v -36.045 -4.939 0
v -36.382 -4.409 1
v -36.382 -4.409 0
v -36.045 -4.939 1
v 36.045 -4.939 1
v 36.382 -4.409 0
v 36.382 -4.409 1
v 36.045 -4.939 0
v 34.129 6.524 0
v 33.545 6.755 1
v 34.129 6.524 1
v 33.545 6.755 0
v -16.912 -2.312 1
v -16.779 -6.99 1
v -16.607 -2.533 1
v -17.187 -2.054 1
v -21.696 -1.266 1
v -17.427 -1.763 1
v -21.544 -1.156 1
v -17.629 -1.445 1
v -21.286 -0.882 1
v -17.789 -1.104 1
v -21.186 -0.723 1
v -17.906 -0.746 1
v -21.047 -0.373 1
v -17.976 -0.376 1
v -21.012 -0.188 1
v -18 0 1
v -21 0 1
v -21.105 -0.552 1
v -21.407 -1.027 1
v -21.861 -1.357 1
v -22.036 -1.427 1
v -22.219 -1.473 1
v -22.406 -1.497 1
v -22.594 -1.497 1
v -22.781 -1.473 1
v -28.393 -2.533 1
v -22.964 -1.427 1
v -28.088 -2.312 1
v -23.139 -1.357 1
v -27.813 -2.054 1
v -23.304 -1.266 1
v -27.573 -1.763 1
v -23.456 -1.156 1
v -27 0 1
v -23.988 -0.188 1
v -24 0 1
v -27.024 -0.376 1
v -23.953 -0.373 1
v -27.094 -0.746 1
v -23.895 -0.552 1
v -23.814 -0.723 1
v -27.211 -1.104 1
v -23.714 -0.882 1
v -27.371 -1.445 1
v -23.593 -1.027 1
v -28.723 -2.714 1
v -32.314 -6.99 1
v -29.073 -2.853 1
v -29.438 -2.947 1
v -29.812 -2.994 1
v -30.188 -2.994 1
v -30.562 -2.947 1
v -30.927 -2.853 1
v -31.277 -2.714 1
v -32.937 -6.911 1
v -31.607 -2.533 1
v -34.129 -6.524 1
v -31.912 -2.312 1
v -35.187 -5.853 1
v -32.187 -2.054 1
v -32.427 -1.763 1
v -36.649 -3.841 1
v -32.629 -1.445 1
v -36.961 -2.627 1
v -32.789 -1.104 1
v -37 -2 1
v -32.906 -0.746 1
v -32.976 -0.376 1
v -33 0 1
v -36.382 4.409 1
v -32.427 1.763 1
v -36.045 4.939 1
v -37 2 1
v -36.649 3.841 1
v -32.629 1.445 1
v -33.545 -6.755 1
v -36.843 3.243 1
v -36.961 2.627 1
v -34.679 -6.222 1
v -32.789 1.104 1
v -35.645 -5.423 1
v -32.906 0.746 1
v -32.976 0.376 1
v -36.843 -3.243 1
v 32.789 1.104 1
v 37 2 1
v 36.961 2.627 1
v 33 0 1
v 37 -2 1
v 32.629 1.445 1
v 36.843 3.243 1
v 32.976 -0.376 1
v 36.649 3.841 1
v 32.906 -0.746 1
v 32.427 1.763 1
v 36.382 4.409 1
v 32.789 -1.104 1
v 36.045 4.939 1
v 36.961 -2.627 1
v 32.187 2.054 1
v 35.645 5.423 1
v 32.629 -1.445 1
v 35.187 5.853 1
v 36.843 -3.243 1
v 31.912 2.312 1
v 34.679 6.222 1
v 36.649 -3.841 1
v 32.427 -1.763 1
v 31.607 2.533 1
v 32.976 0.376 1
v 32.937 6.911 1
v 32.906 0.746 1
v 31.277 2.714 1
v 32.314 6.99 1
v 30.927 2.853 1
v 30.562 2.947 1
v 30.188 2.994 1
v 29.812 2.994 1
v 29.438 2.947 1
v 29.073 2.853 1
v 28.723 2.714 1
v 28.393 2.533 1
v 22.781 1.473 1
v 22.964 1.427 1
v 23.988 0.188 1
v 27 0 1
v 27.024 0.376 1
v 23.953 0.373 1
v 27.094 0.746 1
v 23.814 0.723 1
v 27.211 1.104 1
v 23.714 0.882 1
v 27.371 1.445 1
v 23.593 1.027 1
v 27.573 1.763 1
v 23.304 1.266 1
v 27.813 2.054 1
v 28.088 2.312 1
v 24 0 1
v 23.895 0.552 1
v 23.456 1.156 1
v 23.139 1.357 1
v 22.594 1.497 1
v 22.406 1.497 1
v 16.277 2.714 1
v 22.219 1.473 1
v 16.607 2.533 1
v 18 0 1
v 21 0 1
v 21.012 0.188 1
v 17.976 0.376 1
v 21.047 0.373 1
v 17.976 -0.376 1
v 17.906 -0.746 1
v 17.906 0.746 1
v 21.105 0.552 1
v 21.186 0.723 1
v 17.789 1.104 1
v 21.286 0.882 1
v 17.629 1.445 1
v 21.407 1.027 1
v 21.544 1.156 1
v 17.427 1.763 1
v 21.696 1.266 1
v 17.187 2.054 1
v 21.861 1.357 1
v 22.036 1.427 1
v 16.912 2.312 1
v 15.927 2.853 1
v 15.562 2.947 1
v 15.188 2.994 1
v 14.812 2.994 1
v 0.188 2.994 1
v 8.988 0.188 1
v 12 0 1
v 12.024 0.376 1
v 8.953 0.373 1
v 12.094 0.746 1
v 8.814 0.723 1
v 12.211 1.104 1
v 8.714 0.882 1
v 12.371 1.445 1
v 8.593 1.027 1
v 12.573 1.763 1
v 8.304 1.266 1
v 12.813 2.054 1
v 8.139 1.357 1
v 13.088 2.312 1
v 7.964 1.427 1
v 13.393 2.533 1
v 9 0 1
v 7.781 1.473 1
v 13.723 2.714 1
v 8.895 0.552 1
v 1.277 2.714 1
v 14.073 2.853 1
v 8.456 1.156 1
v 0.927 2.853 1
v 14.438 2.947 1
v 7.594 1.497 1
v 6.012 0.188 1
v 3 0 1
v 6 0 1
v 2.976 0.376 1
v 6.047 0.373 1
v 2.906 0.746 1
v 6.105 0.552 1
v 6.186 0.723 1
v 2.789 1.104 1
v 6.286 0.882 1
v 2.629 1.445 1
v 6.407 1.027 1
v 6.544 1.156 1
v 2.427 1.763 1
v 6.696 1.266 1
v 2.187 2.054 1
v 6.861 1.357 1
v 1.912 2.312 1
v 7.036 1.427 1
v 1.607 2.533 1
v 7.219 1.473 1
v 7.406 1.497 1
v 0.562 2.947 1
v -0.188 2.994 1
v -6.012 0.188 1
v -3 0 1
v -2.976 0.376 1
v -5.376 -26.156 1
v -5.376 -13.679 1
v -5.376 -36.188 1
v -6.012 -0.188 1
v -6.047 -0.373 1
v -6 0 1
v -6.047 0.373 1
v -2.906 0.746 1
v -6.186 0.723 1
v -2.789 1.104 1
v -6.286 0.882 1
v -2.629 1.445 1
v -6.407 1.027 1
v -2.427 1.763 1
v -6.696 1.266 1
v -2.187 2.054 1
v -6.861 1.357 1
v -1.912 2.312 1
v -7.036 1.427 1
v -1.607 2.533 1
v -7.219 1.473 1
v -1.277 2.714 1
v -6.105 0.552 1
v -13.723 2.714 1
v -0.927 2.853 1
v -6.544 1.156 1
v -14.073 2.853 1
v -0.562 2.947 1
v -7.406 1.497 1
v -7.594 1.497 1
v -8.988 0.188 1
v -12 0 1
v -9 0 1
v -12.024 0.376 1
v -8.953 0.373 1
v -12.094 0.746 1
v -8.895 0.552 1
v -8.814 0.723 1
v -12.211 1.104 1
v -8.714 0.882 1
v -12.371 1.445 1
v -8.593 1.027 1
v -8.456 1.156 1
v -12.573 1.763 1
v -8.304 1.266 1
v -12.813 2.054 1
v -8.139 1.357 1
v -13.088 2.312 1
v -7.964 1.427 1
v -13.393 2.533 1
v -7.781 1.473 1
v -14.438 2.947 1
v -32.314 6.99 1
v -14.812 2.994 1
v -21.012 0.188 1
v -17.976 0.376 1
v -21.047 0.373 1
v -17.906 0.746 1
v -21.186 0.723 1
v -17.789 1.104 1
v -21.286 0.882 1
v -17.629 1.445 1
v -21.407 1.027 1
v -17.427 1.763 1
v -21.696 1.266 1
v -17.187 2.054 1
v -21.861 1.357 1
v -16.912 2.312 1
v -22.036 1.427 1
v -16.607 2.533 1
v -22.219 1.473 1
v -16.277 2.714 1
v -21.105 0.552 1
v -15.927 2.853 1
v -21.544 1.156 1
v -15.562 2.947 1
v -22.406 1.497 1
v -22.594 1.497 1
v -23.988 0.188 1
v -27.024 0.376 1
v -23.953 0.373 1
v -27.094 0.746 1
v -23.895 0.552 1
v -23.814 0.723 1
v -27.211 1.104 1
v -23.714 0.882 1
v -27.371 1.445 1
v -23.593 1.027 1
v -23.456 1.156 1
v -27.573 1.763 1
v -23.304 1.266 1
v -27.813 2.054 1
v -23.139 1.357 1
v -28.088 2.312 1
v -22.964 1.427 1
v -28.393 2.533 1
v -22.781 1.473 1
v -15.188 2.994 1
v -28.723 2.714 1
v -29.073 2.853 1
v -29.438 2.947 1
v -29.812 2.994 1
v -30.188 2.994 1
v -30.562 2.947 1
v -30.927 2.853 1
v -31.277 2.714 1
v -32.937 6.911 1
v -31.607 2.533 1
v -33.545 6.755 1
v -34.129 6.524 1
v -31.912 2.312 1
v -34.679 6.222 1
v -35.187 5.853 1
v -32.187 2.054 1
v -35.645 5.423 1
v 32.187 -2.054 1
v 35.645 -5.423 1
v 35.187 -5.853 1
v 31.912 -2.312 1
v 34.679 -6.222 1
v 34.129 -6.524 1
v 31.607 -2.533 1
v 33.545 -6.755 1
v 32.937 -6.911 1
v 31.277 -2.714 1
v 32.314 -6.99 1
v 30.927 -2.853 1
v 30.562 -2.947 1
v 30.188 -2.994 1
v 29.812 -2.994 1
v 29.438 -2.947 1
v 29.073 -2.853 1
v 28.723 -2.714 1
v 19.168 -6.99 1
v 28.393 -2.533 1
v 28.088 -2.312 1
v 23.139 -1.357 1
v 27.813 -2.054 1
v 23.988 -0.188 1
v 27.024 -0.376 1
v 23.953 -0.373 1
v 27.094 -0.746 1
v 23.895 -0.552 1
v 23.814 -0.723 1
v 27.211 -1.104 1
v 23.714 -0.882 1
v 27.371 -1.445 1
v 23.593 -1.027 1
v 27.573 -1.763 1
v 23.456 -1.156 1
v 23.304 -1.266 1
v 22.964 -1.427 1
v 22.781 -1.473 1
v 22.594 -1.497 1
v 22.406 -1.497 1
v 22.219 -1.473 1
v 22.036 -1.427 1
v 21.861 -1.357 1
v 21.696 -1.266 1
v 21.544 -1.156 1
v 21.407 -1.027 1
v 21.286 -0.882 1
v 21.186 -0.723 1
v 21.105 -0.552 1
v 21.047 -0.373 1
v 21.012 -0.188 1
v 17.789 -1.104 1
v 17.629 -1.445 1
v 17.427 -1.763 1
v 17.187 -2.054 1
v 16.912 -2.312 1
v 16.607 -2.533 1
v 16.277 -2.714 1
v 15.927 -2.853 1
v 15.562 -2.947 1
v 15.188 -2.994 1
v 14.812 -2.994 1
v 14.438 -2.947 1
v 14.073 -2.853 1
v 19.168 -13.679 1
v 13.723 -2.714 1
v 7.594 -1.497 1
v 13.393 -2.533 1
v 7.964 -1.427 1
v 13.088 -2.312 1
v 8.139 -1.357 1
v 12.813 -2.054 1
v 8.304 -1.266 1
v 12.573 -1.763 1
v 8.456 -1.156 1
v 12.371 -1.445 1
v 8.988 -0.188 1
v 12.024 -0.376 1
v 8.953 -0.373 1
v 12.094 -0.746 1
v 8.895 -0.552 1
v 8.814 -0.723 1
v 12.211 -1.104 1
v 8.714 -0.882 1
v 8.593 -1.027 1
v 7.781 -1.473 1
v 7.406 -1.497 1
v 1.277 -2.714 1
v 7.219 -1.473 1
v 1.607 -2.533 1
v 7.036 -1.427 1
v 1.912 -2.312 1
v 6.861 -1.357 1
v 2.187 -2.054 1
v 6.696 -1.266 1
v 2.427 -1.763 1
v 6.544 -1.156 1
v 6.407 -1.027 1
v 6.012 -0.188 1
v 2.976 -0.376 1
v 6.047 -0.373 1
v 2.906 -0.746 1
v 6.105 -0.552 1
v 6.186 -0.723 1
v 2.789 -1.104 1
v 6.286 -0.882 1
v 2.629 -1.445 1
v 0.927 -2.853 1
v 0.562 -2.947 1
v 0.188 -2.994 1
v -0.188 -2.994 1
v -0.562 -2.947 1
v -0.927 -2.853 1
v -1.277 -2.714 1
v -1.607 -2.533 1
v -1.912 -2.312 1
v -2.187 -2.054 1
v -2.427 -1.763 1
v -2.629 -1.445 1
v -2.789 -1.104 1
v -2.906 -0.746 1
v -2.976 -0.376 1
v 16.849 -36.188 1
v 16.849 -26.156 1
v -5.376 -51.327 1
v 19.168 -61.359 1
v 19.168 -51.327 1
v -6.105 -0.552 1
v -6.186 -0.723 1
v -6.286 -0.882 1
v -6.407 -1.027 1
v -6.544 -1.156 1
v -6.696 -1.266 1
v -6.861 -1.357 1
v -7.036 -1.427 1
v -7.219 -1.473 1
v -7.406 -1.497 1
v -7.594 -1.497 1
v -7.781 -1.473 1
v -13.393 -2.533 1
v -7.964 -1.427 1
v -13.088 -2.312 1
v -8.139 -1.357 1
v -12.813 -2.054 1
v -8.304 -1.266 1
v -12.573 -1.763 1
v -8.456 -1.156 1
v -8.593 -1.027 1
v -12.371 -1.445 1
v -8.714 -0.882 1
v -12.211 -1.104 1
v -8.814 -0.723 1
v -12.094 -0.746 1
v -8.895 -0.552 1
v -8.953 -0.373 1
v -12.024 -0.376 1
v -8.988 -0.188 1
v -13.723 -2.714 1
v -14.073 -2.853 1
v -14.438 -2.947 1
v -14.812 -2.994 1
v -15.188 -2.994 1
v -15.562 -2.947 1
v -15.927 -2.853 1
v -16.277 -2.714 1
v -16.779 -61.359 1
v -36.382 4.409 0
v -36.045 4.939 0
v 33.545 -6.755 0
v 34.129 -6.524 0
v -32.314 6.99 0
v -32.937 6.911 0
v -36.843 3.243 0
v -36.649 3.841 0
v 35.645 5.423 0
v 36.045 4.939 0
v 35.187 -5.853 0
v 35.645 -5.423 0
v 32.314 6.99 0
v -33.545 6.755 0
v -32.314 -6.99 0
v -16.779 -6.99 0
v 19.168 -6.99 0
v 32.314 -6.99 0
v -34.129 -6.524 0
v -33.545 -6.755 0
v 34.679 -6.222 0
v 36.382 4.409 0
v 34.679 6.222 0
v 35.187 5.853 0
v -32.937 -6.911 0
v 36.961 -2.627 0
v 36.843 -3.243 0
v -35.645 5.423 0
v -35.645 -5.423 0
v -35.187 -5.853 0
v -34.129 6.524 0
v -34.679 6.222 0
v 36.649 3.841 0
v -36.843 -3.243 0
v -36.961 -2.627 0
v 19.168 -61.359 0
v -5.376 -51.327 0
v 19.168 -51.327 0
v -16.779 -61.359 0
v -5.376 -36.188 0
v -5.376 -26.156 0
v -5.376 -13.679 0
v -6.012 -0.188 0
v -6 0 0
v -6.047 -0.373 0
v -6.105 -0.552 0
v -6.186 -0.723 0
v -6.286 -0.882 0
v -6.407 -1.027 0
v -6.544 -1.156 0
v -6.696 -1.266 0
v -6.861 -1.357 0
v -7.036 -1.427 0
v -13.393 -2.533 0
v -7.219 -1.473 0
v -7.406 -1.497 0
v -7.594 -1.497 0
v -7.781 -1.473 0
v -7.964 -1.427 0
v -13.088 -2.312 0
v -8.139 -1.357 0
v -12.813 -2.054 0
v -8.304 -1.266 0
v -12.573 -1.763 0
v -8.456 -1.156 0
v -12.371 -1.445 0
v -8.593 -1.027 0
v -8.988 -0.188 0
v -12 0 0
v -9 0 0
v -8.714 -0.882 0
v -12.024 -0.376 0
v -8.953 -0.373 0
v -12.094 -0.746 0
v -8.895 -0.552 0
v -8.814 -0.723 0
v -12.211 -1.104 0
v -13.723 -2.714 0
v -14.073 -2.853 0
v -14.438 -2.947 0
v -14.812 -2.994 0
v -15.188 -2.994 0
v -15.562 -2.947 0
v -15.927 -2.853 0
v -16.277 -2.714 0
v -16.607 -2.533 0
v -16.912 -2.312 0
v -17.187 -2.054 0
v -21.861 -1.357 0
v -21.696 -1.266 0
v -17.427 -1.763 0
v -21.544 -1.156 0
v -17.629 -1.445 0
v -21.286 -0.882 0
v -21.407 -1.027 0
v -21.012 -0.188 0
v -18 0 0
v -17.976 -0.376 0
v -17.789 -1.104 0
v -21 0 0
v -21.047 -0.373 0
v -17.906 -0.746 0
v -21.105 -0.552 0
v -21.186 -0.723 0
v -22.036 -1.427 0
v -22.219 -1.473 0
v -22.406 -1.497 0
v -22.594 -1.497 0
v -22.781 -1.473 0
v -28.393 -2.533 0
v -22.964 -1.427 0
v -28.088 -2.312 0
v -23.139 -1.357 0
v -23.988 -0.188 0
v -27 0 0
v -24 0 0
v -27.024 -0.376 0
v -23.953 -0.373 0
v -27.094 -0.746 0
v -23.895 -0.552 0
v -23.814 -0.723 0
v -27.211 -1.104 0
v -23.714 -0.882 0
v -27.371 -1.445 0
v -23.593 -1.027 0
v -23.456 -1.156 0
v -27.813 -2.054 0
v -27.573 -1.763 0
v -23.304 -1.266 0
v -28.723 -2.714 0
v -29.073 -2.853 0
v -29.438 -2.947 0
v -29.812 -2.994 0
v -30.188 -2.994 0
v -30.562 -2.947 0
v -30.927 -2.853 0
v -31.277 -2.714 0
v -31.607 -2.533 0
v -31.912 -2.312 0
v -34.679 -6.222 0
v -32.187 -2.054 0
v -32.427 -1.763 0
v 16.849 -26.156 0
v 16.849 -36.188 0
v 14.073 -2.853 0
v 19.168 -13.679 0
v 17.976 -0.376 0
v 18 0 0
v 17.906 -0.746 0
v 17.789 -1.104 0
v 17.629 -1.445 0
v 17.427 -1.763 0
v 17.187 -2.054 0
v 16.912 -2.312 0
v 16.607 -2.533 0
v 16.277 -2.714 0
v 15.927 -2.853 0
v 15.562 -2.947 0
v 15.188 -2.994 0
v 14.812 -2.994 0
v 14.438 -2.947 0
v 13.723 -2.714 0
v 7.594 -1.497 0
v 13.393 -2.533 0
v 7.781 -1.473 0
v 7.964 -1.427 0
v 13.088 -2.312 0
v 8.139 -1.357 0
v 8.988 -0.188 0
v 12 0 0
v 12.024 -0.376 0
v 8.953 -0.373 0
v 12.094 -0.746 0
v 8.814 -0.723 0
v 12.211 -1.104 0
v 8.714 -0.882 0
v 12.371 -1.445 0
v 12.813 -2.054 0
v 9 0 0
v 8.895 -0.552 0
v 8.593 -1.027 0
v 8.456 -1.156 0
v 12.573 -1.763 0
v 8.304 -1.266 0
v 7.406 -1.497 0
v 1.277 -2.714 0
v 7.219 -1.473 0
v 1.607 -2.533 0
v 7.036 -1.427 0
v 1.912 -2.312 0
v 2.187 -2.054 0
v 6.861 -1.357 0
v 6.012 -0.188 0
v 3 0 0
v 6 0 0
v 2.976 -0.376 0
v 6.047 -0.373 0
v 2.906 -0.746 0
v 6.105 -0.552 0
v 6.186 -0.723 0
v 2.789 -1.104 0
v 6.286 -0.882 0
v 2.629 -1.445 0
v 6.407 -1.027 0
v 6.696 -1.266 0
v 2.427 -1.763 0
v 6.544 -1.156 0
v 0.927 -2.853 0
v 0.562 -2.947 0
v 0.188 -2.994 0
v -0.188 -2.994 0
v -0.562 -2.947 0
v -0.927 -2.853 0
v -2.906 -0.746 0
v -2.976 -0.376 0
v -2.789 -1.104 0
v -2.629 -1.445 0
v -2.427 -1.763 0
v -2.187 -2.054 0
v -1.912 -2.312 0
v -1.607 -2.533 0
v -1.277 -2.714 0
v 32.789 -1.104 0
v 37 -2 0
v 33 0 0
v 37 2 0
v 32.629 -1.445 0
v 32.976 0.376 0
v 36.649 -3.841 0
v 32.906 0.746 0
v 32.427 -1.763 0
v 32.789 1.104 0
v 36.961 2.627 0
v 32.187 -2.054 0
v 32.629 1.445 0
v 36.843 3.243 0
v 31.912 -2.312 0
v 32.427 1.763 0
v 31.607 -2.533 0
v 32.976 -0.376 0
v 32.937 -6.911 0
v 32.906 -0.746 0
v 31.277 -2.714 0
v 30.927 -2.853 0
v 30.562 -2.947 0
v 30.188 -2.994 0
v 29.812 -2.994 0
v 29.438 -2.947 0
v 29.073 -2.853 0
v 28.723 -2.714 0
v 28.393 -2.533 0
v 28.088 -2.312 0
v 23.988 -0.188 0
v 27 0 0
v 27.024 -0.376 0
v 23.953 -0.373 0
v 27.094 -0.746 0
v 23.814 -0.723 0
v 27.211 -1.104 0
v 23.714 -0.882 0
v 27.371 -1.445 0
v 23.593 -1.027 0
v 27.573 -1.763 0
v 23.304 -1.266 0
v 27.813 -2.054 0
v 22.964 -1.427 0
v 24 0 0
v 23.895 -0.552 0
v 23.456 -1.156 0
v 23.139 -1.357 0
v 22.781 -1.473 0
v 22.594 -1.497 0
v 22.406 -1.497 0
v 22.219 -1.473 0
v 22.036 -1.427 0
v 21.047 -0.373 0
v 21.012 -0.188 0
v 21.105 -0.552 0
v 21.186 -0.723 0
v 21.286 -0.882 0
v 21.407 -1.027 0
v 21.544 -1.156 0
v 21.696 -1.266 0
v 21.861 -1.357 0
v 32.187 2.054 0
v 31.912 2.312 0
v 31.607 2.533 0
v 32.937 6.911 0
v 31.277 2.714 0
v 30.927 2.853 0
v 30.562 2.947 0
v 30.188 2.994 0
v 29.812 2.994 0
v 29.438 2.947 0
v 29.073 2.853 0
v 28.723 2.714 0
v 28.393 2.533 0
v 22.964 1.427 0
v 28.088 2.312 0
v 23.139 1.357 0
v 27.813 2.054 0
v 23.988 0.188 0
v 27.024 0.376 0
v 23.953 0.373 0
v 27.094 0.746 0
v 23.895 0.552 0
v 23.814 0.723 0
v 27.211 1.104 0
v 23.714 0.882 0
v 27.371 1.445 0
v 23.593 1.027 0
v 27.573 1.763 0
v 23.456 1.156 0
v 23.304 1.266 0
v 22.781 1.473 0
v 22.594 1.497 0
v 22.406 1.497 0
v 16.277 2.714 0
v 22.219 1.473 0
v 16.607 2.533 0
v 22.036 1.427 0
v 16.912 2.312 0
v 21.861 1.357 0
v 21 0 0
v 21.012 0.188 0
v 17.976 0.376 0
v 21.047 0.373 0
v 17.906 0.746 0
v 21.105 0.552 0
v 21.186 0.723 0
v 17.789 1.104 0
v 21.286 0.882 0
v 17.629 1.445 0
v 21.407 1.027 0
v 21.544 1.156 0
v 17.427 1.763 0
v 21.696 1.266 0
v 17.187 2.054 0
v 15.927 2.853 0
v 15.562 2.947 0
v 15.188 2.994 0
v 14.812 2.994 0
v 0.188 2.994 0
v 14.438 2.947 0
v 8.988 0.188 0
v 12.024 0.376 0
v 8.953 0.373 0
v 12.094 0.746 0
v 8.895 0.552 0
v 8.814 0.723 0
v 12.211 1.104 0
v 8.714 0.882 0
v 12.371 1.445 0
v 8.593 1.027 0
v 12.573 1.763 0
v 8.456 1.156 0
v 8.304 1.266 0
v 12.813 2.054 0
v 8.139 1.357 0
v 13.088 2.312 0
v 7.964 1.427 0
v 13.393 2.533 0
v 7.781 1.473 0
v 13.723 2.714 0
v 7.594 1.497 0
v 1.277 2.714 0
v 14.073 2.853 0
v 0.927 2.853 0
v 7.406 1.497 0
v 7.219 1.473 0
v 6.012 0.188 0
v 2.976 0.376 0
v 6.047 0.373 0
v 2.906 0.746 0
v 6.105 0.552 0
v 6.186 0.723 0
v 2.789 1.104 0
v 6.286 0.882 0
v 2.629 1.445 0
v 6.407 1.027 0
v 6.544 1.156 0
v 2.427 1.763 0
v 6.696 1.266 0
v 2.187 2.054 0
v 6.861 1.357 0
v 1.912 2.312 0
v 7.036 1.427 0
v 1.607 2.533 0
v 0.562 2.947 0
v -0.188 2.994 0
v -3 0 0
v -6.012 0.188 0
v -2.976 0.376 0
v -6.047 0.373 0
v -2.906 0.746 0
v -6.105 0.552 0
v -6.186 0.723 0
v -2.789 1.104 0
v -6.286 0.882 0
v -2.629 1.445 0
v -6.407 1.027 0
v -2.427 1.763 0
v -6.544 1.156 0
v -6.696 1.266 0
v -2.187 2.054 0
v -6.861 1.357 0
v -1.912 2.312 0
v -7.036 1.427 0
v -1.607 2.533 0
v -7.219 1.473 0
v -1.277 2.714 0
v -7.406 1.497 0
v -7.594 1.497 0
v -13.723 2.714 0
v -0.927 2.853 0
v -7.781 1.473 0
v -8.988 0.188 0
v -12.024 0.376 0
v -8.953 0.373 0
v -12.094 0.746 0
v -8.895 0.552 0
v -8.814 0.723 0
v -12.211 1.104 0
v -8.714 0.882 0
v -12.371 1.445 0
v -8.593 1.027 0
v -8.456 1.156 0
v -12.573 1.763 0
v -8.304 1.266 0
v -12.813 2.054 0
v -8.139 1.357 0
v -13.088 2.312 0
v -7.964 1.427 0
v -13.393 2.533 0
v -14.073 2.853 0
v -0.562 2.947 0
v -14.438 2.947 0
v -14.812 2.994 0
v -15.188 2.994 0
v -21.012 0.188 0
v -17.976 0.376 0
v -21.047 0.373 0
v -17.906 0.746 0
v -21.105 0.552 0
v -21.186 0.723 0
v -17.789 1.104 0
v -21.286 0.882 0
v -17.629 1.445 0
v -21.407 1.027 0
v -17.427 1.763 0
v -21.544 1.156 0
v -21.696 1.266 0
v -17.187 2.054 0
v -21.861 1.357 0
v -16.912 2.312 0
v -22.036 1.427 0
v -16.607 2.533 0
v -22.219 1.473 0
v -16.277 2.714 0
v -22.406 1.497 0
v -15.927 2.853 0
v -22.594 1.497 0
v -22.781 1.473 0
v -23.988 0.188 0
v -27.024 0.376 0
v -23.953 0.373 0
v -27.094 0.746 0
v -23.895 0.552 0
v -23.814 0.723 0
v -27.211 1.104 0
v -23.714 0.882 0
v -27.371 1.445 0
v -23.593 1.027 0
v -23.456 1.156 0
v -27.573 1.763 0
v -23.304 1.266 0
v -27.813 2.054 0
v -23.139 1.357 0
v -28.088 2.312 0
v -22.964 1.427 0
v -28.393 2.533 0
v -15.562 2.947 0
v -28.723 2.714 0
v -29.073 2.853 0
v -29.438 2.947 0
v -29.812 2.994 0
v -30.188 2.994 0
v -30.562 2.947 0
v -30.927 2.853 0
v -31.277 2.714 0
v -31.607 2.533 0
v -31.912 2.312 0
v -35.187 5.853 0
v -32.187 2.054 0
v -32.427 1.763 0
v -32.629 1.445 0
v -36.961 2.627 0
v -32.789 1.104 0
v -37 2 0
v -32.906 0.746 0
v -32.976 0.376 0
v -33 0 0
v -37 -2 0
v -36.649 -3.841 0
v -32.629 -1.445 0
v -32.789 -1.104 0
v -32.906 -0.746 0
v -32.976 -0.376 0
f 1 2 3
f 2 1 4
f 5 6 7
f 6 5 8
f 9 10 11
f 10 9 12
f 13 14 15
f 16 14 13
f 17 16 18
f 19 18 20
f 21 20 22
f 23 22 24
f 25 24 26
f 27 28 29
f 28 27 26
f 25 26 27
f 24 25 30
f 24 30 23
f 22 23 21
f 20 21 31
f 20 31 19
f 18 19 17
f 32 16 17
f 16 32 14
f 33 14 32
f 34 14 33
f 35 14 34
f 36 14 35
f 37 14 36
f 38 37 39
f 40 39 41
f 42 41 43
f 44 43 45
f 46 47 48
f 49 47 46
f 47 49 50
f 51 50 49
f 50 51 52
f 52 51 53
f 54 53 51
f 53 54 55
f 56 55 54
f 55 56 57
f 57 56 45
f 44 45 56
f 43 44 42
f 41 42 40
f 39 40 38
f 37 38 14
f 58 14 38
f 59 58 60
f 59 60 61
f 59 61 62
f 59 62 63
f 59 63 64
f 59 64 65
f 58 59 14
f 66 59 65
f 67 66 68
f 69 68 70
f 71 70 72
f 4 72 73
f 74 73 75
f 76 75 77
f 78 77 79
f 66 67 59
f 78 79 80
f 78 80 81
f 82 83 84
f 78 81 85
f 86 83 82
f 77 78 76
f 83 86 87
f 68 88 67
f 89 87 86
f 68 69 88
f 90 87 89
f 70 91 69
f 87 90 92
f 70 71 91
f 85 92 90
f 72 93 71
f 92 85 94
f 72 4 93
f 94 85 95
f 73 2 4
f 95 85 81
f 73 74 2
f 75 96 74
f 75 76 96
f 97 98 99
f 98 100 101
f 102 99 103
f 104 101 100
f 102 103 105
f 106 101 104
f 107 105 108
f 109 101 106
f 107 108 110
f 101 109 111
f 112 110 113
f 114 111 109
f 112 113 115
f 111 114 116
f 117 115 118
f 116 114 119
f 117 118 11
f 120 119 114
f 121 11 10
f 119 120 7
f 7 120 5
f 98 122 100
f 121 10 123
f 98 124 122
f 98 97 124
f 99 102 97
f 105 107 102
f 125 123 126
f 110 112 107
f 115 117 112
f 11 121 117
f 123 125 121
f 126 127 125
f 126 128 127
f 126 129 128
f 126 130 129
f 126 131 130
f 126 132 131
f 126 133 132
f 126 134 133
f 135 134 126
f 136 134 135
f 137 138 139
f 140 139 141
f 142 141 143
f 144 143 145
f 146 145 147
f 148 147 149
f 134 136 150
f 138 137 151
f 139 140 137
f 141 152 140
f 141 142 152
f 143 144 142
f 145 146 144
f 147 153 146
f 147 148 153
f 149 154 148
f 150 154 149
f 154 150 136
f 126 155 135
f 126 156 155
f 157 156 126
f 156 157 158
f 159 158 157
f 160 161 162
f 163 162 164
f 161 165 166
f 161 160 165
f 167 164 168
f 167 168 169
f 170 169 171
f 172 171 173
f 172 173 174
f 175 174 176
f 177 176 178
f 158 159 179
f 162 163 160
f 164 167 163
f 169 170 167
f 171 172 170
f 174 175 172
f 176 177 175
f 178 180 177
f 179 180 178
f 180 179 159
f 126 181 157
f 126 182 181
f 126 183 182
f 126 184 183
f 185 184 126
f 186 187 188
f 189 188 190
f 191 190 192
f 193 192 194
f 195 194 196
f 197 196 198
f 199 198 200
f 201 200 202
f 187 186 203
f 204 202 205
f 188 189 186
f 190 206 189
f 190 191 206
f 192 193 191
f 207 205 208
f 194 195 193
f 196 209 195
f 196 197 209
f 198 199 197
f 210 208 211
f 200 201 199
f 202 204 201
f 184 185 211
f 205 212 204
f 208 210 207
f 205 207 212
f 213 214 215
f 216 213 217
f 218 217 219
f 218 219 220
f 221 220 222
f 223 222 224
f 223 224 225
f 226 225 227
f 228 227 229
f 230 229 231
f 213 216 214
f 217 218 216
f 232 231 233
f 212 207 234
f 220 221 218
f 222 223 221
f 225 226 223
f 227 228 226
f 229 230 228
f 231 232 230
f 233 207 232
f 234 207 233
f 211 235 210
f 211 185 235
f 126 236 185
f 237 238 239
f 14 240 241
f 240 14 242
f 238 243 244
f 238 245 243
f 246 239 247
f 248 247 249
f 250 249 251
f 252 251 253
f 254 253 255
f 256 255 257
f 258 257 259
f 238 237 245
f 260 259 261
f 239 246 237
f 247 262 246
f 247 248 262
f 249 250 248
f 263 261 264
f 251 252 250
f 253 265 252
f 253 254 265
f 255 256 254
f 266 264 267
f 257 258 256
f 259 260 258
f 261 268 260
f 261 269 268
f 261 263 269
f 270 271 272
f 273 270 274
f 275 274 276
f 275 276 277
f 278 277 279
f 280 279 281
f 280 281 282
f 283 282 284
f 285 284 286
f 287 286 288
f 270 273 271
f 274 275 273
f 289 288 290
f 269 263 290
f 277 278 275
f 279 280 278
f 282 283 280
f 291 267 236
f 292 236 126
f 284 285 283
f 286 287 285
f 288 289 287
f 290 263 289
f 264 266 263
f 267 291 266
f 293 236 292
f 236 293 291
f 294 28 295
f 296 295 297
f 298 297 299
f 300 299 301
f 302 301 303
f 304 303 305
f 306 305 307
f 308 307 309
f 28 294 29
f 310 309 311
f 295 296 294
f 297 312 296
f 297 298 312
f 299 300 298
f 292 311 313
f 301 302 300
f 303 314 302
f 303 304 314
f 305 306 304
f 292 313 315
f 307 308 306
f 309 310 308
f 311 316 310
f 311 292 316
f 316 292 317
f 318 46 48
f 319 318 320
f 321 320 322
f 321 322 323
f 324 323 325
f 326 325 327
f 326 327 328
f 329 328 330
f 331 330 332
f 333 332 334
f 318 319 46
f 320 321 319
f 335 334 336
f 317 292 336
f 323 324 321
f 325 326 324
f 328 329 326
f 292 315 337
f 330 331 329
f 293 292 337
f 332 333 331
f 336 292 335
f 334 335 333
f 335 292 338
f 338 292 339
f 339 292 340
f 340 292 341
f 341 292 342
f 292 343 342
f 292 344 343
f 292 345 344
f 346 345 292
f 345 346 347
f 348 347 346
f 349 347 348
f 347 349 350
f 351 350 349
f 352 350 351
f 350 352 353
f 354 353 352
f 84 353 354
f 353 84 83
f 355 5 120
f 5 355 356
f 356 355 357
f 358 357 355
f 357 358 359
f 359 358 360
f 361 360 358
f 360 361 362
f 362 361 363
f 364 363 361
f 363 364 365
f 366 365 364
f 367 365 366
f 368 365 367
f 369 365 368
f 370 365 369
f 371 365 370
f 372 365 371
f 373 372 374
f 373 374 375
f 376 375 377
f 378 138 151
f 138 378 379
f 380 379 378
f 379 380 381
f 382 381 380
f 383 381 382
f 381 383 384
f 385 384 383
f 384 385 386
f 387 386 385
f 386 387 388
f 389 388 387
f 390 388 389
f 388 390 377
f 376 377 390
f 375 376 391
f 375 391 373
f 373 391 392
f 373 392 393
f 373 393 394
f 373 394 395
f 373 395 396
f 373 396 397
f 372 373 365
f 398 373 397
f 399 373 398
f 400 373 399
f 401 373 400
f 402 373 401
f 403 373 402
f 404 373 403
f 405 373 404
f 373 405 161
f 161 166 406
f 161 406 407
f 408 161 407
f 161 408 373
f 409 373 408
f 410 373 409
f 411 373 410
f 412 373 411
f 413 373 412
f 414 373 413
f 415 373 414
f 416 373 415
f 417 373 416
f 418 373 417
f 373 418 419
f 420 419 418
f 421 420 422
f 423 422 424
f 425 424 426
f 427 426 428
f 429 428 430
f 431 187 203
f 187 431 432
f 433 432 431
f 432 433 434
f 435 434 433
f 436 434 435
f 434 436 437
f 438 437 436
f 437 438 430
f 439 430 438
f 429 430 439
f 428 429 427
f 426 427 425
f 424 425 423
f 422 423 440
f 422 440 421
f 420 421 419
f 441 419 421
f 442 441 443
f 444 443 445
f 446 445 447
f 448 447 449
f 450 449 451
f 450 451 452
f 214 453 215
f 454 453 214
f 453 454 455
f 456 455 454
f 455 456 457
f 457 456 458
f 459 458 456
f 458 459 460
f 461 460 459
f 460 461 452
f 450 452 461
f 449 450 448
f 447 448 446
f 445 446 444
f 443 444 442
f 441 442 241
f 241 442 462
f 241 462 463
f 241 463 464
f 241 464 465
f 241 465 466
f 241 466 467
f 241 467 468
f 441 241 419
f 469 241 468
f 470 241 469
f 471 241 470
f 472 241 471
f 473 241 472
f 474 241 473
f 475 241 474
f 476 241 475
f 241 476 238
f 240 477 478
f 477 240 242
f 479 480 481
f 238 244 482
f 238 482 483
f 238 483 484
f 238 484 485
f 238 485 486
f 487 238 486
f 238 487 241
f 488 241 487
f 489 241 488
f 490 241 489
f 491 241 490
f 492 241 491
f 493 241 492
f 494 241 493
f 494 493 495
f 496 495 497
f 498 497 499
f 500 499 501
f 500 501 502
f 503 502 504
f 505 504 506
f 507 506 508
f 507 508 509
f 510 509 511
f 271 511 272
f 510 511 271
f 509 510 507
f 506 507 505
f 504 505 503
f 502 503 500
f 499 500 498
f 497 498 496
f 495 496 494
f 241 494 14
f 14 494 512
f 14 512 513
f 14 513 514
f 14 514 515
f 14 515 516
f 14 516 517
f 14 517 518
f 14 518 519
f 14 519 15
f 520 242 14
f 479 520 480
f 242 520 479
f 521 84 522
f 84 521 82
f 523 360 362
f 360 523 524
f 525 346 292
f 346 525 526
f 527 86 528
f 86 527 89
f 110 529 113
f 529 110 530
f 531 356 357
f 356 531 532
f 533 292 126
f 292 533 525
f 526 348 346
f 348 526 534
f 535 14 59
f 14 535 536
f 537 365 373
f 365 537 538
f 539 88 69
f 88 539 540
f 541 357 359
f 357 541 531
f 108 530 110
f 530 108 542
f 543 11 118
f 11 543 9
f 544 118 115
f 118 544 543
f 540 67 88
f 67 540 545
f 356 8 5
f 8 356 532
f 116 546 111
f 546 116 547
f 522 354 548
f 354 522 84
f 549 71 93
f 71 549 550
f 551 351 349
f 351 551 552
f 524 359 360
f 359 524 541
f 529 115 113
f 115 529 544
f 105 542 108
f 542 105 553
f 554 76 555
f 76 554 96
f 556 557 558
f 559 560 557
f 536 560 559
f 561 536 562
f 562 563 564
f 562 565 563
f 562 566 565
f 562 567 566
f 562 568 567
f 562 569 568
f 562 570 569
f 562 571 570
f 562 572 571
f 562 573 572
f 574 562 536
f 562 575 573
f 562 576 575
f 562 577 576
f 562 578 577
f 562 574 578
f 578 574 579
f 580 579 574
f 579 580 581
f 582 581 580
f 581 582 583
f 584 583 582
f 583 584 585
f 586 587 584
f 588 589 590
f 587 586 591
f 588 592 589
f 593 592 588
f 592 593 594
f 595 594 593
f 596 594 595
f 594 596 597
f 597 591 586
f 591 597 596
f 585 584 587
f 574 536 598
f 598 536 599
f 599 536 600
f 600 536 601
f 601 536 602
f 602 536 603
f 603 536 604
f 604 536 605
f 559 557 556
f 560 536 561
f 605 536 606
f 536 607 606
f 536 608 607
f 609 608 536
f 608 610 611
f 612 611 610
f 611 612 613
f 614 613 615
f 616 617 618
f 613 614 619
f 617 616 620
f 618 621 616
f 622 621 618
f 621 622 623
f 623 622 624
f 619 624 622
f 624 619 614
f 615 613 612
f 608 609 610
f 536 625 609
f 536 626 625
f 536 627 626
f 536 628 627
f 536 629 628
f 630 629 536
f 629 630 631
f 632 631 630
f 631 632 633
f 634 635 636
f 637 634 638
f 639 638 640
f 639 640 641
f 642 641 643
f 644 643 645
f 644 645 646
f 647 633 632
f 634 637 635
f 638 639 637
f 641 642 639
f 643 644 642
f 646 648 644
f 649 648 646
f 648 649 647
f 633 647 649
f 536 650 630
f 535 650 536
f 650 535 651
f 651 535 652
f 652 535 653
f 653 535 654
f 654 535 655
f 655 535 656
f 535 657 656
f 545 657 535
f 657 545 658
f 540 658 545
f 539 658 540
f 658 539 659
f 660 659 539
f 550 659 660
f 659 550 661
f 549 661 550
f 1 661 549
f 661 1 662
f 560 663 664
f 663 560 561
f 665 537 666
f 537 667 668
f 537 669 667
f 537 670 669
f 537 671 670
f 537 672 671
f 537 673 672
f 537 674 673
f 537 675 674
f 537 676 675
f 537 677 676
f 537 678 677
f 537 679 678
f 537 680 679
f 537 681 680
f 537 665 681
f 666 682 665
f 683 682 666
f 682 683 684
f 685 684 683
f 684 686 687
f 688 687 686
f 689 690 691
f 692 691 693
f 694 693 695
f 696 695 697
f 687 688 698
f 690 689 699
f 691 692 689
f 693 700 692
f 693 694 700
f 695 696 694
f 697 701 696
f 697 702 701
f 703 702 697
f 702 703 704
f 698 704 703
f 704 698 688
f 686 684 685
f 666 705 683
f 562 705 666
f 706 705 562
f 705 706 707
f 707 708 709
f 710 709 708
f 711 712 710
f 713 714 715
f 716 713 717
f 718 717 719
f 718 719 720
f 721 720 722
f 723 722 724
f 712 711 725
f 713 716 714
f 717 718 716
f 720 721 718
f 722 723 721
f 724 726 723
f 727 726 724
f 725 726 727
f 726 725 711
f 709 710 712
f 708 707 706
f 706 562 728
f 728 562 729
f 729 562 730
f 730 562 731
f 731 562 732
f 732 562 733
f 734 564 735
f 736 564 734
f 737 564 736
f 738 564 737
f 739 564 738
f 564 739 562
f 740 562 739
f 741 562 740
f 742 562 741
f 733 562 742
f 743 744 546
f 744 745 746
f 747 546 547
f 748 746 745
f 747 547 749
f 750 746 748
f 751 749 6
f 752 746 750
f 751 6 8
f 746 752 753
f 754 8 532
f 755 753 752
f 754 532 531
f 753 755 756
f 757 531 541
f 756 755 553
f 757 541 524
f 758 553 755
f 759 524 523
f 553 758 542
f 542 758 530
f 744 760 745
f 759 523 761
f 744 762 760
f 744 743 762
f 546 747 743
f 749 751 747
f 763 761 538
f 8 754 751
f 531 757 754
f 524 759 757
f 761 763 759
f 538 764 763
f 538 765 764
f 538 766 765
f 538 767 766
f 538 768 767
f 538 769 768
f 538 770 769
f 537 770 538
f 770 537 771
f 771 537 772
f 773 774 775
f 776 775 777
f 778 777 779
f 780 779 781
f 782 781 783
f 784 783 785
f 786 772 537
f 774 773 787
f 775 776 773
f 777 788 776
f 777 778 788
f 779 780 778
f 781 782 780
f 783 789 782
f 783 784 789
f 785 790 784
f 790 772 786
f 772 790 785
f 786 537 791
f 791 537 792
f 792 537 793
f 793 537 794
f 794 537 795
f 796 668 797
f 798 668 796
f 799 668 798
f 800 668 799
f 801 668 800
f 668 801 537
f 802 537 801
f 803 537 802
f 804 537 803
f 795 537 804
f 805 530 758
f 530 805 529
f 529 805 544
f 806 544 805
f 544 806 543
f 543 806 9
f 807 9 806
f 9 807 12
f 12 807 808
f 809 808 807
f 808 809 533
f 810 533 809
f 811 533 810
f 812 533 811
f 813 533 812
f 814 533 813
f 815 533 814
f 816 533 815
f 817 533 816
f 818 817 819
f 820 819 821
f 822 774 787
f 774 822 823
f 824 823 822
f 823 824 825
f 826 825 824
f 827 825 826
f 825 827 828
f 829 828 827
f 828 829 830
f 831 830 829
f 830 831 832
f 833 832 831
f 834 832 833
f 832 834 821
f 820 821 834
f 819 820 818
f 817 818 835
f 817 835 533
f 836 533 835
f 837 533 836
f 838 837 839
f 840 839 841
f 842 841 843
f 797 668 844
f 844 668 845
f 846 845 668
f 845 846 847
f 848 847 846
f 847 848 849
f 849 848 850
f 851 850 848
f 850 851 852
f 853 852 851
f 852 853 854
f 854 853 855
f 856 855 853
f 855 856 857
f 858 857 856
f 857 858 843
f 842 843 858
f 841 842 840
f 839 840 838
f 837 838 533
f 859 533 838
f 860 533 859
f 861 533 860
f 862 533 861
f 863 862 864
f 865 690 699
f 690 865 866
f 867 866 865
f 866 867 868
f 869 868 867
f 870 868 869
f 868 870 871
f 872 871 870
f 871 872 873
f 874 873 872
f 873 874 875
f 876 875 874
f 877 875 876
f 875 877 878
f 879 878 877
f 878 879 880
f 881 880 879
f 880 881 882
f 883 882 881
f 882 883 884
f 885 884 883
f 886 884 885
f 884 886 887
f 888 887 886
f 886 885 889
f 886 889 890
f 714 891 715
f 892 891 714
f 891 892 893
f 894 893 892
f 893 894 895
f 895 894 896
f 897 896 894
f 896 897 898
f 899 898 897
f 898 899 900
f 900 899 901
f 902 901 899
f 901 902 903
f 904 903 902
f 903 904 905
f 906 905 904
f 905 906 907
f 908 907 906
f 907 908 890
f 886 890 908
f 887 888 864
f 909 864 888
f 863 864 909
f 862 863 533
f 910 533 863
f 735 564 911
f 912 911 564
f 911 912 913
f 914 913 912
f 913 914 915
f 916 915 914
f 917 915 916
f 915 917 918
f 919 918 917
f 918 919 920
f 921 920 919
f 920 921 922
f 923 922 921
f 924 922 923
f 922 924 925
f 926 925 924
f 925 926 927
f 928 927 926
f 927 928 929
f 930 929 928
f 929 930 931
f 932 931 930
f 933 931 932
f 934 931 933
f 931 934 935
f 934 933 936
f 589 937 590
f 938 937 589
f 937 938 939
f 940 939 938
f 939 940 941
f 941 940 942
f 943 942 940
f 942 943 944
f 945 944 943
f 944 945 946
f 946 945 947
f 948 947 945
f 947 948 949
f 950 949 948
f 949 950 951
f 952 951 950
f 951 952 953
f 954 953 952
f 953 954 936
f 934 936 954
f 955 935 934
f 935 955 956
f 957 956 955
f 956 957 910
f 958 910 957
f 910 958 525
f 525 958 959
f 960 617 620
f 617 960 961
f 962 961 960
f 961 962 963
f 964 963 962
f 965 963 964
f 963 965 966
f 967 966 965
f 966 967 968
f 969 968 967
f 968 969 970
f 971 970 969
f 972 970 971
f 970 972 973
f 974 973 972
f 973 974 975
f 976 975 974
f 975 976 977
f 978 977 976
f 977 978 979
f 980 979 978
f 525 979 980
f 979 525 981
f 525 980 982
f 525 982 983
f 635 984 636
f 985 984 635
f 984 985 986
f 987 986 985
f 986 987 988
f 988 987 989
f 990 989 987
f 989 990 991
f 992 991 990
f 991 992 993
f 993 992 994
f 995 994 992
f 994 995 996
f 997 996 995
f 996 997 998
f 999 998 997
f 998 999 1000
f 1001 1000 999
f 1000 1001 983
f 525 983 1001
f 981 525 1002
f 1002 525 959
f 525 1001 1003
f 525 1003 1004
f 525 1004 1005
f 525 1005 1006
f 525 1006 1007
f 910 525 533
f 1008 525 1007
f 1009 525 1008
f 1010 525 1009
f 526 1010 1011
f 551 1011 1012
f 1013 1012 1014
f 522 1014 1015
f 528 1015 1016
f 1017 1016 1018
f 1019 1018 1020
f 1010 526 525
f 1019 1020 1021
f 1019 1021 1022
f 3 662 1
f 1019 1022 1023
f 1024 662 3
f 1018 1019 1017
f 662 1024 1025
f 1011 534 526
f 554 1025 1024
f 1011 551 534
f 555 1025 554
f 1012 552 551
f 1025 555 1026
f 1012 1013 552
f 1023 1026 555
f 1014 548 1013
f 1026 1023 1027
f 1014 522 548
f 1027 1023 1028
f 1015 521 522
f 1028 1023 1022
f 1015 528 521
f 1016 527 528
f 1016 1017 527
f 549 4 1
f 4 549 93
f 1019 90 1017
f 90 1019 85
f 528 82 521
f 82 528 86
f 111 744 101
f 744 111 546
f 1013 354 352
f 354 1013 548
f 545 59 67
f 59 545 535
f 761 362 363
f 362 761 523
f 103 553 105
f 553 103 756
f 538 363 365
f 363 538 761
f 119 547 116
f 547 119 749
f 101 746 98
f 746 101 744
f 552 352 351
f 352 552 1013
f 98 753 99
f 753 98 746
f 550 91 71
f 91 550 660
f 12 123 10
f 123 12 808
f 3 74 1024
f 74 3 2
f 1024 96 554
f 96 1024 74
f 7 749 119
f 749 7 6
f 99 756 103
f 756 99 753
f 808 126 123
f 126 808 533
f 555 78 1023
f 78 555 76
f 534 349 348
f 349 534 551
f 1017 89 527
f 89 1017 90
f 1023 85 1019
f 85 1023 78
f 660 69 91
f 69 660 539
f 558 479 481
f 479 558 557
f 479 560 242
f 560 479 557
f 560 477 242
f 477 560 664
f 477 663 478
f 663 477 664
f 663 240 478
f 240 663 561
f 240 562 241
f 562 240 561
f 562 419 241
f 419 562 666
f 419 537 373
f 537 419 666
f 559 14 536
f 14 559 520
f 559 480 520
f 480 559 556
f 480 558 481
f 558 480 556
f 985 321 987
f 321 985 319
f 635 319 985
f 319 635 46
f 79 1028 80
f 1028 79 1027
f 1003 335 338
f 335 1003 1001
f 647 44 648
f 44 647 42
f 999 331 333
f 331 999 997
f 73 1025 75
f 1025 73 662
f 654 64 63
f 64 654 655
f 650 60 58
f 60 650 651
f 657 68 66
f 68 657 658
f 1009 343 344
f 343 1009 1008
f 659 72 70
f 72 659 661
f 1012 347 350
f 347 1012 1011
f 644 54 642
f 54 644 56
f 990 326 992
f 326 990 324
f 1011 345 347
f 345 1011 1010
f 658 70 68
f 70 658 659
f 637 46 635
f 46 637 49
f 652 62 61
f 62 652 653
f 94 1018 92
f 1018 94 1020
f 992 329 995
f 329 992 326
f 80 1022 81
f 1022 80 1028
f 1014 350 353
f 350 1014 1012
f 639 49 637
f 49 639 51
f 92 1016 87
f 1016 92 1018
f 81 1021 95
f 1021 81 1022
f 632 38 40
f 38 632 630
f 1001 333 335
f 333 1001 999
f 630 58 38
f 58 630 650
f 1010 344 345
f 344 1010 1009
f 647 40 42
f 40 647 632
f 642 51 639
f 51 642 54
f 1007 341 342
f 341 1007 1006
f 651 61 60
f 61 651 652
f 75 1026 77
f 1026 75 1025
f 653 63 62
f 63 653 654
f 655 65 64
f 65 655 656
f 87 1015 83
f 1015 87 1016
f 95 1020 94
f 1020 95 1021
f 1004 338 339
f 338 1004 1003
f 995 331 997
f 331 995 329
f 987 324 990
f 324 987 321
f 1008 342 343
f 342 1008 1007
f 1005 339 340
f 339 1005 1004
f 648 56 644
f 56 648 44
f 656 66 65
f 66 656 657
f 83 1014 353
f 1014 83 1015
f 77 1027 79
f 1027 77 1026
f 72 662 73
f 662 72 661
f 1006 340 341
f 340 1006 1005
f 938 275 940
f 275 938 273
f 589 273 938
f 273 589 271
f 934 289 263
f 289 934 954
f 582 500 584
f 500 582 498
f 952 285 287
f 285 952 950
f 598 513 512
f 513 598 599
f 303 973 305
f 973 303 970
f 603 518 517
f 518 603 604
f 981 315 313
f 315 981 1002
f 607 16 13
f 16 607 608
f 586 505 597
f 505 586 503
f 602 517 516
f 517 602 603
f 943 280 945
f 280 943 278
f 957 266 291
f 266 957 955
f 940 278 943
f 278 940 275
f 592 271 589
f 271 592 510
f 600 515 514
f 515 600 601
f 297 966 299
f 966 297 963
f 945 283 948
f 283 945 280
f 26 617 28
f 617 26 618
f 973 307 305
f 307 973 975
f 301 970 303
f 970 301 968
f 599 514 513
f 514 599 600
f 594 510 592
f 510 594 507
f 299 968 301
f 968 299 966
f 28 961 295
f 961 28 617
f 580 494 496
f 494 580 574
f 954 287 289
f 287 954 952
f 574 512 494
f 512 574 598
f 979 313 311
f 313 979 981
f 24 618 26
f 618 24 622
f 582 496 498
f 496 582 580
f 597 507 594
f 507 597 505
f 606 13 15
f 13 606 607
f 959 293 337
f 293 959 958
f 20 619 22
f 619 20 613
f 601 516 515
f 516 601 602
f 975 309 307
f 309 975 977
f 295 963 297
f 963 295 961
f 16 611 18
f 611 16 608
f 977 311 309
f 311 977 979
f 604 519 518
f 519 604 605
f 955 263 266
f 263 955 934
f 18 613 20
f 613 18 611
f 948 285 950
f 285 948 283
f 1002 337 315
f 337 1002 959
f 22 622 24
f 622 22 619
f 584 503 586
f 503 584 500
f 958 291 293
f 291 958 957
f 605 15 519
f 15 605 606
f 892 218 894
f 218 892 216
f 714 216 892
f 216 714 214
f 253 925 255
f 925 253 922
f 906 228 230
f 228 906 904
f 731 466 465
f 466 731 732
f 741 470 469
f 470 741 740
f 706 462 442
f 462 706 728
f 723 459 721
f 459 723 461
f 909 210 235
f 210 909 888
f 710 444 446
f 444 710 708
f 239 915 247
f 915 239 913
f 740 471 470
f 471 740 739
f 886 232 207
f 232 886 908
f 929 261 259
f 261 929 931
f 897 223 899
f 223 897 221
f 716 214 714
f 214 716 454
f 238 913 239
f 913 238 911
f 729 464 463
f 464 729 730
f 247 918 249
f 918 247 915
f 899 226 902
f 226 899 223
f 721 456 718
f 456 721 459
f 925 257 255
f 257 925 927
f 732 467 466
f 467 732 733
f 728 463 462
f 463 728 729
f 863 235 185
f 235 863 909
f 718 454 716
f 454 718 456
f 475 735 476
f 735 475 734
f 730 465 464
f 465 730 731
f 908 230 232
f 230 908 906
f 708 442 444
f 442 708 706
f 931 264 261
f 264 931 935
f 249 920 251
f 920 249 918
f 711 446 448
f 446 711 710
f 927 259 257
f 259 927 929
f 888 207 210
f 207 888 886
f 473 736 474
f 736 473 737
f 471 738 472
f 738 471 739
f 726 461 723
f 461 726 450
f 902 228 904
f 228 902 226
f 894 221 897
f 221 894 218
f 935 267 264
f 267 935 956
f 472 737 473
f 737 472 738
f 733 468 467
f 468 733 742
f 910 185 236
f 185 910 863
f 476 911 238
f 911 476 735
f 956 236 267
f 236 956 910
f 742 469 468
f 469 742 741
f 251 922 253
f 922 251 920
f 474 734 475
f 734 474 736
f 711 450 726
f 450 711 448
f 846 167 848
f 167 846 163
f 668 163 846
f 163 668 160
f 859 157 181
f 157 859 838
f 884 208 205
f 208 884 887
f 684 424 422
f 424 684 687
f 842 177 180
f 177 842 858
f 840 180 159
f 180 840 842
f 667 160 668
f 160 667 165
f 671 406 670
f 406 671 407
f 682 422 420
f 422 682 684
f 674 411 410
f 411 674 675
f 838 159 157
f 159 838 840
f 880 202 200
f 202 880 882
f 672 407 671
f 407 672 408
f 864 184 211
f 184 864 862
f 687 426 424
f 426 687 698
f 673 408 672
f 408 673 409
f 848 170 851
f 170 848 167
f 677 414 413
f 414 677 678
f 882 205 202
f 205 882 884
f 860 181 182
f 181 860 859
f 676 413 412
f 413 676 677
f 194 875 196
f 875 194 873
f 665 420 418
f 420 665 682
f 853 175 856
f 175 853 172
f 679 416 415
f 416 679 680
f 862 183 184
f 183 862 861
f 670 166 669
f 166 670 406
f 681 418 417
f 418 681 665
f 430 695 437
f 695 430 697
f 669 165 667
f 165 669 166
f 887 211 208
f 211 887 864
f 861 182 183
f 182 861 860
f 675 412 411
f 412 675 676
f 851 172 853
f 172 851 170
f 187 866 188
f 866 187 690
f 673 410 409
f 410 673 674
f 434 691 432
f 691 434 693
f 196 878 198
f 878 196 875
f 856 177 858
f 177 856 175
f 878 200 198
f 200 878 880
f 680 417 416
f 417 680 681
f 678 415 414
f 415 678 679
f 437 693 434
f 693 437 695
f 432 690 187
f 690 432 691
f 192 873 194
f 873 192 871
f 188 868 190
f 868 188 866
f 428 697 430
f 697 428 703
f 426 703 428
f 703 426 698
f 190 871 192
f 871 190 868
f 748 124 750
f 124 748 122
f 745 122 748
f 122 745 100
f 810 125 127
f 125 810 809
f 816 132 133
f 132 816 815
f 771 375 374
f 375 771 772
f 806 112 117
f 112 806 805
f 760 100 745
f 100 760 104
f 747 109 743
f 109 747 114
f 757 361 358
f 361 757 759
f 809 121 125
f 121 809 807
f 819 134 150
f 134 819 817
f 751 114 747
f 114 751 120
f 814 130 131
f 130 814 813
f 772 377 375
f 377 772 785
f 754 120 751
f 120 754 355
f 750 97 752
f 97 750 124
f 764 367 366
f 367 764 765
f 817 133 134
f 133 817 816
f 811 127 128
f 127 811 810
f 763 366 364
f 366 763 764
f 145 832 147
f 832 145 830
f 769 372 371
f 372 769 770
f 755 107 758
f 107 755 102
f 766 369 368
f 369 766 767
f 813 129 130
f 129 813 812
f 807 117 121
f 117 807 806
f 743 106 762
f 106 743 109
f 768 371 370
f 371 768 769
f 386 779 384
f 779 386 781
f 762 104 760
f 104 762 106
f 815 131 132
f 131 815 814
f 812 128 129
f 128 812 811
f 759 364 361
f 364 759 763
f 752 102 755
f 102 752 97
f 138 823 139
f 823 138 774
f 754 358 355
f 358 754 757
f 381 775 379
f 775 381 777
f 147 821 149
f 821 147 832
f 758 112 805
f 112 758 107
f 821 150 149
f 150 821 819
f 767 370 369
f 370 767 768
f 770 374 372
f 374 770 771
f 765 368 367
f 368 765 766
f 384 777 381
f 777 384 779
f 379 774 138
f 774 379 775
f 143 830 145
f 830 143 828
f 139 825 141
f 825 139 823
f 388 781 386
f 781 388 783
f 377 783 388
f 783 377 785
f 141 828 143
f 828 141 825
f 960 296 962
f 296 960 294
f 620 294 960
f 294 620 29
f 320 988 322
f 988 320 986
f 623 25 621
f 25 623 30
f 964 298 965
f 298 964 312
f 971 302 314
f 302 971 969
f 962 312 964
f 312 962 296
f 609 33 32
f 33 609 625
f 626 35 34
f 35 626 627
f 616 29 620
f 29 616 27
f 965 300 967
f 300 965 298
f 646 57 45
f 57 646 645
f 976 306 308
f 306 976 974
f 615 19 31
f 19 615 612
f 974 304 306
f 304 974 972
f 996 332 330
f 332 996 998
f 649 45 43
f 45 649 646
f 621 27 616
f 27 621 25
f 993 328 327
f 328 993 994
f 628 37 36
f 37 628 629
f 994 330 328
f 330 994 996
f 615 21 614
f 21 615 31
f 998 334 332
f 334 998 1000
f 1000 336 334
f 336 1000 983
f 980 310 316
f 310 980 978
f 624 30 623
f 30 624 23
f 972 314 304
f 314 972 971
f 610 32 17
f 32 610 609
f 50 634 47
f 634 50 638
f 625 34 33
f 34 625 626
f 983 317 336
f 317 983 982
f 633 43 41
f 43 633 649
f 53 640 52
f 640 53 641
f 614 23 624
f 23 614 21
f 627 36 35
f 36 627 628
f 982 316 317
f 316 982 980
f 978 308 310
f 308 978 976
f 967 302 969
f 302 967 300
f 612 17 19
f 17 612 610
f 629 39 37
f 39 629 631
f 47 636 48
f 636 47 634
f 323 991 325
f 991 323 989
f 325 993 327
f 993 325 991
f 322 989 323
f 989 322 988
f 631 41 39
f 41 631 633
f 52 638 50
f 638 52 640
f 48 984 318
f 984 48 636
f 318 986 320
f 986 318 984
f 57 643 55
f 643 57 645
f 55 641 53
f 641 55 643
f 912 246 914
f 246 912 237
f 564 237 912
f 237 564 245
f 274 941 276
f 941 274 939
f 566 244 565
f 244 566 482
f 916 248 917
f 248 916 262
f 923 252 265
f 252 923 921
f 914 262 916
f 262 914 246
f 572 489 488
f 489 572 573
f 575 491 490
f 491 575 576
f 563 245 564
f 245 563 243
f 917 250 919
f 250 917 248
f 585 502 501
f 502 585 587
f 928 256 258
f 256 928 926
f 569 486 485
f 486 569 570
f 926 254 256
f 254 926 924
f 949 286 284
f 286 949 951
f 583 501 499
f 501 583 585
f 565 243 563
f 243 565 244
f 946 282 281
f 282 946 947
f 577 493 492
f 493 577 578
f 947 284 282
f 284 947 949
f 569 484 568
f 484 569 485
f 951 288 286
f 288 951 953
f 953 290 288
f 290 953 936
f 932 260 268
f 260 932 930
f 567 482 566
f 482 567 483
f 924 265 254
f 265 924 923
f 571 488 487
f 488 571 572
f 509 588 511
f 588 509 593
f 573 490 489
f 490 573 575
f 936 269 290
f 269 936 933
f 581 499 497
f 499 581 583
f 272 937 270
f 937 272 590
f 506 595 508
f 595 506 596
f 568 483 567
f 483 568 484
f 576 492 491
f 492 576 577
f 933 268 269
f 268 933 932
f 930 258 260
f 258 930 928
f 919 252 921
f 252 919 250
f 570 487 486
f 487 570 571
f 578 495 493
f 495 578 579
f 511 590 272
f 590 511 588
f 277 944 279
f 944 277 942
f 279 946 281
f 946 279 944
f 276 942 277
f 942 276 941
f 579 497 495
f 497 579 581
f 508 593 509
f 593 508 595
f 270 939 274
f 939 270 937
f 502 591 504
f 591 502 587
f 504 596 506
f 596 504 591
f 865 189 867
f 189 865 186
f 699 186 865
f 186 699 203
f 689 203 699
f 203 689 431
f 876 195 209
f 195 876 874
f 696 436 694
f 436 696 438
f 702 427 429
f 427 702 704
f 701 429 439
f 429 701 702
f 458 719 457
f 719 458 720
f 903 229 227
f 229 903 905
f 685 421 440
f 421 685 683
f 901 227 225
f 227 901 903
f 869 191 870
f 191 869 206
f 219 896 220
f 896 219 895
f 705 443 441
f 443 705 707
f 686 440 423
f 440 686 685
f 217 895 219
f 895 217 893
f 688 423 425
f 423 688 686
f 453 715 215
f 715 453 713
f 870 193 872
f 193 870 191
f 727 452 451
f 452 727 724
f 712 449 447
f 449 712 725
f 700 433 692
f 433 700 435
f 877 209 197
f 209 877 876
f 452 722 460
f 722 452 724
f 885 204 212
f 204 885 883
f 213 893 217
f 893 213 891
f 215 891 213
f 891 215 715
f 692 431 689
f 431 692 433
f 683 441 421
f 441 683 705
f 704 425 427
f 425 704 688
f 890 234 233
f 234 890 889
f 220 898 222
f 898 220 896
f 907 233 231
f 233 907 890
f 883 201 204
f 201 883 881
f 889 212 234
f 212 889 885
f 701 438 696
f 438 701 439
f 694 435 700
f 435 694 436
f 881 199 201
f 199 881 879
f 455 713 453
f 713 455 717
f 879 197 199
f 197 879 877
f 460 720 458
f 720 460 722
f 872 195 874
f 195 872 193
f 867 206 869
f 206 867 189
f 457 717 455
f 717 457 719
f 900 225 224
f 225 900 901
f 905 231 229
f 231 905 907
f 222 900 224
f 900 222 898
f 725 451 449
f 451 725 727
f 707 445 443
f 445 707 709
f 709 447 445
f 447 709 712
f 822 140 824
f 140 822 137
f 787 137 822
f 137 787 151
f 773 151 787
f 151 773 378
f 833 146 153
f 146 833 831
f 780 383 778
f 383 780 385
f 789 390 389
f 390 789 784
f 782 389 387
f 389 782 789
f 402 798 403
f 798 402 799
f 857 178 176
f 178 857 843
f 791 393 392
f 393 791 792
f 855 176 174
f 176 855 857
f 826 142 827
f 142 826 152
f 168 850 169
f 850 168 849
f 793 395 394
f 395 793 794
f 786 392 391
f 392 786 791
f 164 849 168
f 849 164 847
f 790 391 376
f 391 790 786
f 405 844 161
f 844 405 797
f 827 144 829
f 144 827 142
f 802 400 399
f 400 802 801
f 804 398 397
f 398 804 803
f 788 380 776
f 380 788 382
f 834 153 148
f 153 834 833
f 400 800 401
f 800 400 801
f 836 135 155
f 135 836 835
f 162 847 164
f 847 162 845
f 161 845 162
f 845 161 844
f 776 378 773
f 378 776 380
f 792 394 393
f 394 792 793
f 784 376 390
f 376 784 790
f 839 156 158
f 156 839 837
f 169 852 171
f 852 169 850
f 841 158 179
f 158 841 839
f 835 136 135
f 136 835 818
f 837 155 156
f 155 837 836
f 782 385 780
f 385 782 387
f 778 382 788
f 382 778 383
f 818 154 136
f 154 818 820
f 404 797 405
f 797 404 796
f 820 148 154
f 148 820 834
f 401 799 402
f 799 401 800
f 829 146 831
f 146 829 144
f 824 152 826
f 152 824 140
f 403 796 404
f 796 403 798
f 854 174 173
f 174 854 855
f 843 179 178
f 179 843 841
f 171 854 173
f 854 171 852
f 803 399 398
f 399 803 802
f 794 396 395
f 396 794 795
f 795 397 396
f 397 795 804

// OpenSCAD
$fn = 50;


difference() {
	union() {
		*color(alpha = 1.0000000000, c = "gray") {
			translate(v = [0, 14, 0]) {
				linear_extrude(height = 1) {
					text(font = "Arial:style=Bold", halign = "center", size = 4.5000000000, text = "COMMENT description oobb_plate_shape_p_type_1_depth_5_width_1_thickness_e_extra_oobb_size", valign = "center");
				}
			}
		}
		hull() {
			translate(v = [-32.0000000000, 2.0000000000, 0]) {
				cylinder(h = 1, r = 5);
			}
			translate(v = [32.0000000000, 2.0000000000, 0]) {
				cylinder(h = 1, r = 5);
			}
			translate(v = [-32.0000000000, -2.0000000000, 0]) {
				cylinder(h = 1, r = 5);
			}
			translate(v = [32.0000000000, -2.0000000000, 0]) {
				cylinder(h = 1, r = 5);
			}
		}
		translate(v = [0, -5, 0]) {
			linear_extrude(height = 1) {
				text(font = "DejaVu Sans Mono:style=Bold", halign = "center", size = 57.0000000000, text = "E", valign = "top");
			}
		}
	}
	union() {
		*color(alpha = 1.0000000000, c = "gray") {
			translate(v = [0, 14, 0]) {
				linear_extrude(height = 1) {
					text(font = "Arial:style=Bold", halign = "center", size = 4.5000000000, text = "COMMENT description oobb_holes_shape_n_type_5_width_1_thickness_e_extra_oobb_size_1_height_'all'_holes_true_both_holes", valign = "center");
				}
			}
		}
		translate(v = [-30.0000000000, 0.0000000000, 0]) {
			translate(v = [0, 0, -50]) {
				cylinder(h = 100, r = 3.0000000000);
			}
		}
		translate(v = [-15.0000000000, 0.0000000000, 0]) {
			translate(v = [0, 0, -50]) {
				cylinder(h = 100, r = 3.0000000000);
			}
		}
		translate(v = [0, 0, -50]) {
			cylinder(h = 100, r = 3.0000000000);
		}
		translate(v = [15.0000000000, 0.0000000000, 0]) {
			translate(v = [0, 0, -50]) {
				cylinder(h = 100, r = 3.0000000000);
			}
		}
		translate(v = [30.0000000000, 0.0000000000, 0]) {
			translate(v = [0, 0, -50]) {
				cylinder(h = 100, r = 3.0000000000);
			}
		}
		translate(v = [-30.0000000000, 0.0000000000, 0]) {
			translate(v = [0, 0, -50]) {
				cylinder(h = 100, r = 1.5000000000);
			}
		}
		translate(v = [-22.5000000000, 0.0000000000, 0]) {
			translate(v = [0, 0, -50]) {
				cylinder(h = 100, r = 1.5000000000);
			}
		}
		translate(v = [-15.0000000000, 0.0000000000, 0]) {
			translate(v = [0, 0, -50]) {
				cylinder(h = 100, r = 1.5000000000);
			}
		}
		translate(v = [-7.5000000000, 0.0000000000, 0]) {
			translate(v = [0, 0, -50]) {
				cylinder(h = 100, r = 1.5000000000);
			}
		}
		translate(v = [0, 0, -50]) {
			cylinder(h = 100, r = 1.5000000000);
		}
		translate(v = [7.5000000000, 0.0000000000, 0]) {
			translate(v = [0, 0, -50]) {
				cylinder(h = 100, r = 1.5000000000);
			}
		}
		translate(v = [15.0000000000, 0.0000000000, 0]) {
			translate(v = [0, 0, -50]) {
				cylinder(h = 100, r = 1.5000000000);
			}
		}
		translate(v = [22.5000000000, 0.0000000000, 0]) {
			translate(v = [0, 0, -50]) {
				cylinder(h = 100, r = 1.5000000000);
			}
		}
		translate(v = [30.0000000000, 0.0000000000, 0]) {
			translate(v = [0, 0, -50]) {
				cylinder(h = 100, r = 1.5000000000);
			}
		}
	}
}
